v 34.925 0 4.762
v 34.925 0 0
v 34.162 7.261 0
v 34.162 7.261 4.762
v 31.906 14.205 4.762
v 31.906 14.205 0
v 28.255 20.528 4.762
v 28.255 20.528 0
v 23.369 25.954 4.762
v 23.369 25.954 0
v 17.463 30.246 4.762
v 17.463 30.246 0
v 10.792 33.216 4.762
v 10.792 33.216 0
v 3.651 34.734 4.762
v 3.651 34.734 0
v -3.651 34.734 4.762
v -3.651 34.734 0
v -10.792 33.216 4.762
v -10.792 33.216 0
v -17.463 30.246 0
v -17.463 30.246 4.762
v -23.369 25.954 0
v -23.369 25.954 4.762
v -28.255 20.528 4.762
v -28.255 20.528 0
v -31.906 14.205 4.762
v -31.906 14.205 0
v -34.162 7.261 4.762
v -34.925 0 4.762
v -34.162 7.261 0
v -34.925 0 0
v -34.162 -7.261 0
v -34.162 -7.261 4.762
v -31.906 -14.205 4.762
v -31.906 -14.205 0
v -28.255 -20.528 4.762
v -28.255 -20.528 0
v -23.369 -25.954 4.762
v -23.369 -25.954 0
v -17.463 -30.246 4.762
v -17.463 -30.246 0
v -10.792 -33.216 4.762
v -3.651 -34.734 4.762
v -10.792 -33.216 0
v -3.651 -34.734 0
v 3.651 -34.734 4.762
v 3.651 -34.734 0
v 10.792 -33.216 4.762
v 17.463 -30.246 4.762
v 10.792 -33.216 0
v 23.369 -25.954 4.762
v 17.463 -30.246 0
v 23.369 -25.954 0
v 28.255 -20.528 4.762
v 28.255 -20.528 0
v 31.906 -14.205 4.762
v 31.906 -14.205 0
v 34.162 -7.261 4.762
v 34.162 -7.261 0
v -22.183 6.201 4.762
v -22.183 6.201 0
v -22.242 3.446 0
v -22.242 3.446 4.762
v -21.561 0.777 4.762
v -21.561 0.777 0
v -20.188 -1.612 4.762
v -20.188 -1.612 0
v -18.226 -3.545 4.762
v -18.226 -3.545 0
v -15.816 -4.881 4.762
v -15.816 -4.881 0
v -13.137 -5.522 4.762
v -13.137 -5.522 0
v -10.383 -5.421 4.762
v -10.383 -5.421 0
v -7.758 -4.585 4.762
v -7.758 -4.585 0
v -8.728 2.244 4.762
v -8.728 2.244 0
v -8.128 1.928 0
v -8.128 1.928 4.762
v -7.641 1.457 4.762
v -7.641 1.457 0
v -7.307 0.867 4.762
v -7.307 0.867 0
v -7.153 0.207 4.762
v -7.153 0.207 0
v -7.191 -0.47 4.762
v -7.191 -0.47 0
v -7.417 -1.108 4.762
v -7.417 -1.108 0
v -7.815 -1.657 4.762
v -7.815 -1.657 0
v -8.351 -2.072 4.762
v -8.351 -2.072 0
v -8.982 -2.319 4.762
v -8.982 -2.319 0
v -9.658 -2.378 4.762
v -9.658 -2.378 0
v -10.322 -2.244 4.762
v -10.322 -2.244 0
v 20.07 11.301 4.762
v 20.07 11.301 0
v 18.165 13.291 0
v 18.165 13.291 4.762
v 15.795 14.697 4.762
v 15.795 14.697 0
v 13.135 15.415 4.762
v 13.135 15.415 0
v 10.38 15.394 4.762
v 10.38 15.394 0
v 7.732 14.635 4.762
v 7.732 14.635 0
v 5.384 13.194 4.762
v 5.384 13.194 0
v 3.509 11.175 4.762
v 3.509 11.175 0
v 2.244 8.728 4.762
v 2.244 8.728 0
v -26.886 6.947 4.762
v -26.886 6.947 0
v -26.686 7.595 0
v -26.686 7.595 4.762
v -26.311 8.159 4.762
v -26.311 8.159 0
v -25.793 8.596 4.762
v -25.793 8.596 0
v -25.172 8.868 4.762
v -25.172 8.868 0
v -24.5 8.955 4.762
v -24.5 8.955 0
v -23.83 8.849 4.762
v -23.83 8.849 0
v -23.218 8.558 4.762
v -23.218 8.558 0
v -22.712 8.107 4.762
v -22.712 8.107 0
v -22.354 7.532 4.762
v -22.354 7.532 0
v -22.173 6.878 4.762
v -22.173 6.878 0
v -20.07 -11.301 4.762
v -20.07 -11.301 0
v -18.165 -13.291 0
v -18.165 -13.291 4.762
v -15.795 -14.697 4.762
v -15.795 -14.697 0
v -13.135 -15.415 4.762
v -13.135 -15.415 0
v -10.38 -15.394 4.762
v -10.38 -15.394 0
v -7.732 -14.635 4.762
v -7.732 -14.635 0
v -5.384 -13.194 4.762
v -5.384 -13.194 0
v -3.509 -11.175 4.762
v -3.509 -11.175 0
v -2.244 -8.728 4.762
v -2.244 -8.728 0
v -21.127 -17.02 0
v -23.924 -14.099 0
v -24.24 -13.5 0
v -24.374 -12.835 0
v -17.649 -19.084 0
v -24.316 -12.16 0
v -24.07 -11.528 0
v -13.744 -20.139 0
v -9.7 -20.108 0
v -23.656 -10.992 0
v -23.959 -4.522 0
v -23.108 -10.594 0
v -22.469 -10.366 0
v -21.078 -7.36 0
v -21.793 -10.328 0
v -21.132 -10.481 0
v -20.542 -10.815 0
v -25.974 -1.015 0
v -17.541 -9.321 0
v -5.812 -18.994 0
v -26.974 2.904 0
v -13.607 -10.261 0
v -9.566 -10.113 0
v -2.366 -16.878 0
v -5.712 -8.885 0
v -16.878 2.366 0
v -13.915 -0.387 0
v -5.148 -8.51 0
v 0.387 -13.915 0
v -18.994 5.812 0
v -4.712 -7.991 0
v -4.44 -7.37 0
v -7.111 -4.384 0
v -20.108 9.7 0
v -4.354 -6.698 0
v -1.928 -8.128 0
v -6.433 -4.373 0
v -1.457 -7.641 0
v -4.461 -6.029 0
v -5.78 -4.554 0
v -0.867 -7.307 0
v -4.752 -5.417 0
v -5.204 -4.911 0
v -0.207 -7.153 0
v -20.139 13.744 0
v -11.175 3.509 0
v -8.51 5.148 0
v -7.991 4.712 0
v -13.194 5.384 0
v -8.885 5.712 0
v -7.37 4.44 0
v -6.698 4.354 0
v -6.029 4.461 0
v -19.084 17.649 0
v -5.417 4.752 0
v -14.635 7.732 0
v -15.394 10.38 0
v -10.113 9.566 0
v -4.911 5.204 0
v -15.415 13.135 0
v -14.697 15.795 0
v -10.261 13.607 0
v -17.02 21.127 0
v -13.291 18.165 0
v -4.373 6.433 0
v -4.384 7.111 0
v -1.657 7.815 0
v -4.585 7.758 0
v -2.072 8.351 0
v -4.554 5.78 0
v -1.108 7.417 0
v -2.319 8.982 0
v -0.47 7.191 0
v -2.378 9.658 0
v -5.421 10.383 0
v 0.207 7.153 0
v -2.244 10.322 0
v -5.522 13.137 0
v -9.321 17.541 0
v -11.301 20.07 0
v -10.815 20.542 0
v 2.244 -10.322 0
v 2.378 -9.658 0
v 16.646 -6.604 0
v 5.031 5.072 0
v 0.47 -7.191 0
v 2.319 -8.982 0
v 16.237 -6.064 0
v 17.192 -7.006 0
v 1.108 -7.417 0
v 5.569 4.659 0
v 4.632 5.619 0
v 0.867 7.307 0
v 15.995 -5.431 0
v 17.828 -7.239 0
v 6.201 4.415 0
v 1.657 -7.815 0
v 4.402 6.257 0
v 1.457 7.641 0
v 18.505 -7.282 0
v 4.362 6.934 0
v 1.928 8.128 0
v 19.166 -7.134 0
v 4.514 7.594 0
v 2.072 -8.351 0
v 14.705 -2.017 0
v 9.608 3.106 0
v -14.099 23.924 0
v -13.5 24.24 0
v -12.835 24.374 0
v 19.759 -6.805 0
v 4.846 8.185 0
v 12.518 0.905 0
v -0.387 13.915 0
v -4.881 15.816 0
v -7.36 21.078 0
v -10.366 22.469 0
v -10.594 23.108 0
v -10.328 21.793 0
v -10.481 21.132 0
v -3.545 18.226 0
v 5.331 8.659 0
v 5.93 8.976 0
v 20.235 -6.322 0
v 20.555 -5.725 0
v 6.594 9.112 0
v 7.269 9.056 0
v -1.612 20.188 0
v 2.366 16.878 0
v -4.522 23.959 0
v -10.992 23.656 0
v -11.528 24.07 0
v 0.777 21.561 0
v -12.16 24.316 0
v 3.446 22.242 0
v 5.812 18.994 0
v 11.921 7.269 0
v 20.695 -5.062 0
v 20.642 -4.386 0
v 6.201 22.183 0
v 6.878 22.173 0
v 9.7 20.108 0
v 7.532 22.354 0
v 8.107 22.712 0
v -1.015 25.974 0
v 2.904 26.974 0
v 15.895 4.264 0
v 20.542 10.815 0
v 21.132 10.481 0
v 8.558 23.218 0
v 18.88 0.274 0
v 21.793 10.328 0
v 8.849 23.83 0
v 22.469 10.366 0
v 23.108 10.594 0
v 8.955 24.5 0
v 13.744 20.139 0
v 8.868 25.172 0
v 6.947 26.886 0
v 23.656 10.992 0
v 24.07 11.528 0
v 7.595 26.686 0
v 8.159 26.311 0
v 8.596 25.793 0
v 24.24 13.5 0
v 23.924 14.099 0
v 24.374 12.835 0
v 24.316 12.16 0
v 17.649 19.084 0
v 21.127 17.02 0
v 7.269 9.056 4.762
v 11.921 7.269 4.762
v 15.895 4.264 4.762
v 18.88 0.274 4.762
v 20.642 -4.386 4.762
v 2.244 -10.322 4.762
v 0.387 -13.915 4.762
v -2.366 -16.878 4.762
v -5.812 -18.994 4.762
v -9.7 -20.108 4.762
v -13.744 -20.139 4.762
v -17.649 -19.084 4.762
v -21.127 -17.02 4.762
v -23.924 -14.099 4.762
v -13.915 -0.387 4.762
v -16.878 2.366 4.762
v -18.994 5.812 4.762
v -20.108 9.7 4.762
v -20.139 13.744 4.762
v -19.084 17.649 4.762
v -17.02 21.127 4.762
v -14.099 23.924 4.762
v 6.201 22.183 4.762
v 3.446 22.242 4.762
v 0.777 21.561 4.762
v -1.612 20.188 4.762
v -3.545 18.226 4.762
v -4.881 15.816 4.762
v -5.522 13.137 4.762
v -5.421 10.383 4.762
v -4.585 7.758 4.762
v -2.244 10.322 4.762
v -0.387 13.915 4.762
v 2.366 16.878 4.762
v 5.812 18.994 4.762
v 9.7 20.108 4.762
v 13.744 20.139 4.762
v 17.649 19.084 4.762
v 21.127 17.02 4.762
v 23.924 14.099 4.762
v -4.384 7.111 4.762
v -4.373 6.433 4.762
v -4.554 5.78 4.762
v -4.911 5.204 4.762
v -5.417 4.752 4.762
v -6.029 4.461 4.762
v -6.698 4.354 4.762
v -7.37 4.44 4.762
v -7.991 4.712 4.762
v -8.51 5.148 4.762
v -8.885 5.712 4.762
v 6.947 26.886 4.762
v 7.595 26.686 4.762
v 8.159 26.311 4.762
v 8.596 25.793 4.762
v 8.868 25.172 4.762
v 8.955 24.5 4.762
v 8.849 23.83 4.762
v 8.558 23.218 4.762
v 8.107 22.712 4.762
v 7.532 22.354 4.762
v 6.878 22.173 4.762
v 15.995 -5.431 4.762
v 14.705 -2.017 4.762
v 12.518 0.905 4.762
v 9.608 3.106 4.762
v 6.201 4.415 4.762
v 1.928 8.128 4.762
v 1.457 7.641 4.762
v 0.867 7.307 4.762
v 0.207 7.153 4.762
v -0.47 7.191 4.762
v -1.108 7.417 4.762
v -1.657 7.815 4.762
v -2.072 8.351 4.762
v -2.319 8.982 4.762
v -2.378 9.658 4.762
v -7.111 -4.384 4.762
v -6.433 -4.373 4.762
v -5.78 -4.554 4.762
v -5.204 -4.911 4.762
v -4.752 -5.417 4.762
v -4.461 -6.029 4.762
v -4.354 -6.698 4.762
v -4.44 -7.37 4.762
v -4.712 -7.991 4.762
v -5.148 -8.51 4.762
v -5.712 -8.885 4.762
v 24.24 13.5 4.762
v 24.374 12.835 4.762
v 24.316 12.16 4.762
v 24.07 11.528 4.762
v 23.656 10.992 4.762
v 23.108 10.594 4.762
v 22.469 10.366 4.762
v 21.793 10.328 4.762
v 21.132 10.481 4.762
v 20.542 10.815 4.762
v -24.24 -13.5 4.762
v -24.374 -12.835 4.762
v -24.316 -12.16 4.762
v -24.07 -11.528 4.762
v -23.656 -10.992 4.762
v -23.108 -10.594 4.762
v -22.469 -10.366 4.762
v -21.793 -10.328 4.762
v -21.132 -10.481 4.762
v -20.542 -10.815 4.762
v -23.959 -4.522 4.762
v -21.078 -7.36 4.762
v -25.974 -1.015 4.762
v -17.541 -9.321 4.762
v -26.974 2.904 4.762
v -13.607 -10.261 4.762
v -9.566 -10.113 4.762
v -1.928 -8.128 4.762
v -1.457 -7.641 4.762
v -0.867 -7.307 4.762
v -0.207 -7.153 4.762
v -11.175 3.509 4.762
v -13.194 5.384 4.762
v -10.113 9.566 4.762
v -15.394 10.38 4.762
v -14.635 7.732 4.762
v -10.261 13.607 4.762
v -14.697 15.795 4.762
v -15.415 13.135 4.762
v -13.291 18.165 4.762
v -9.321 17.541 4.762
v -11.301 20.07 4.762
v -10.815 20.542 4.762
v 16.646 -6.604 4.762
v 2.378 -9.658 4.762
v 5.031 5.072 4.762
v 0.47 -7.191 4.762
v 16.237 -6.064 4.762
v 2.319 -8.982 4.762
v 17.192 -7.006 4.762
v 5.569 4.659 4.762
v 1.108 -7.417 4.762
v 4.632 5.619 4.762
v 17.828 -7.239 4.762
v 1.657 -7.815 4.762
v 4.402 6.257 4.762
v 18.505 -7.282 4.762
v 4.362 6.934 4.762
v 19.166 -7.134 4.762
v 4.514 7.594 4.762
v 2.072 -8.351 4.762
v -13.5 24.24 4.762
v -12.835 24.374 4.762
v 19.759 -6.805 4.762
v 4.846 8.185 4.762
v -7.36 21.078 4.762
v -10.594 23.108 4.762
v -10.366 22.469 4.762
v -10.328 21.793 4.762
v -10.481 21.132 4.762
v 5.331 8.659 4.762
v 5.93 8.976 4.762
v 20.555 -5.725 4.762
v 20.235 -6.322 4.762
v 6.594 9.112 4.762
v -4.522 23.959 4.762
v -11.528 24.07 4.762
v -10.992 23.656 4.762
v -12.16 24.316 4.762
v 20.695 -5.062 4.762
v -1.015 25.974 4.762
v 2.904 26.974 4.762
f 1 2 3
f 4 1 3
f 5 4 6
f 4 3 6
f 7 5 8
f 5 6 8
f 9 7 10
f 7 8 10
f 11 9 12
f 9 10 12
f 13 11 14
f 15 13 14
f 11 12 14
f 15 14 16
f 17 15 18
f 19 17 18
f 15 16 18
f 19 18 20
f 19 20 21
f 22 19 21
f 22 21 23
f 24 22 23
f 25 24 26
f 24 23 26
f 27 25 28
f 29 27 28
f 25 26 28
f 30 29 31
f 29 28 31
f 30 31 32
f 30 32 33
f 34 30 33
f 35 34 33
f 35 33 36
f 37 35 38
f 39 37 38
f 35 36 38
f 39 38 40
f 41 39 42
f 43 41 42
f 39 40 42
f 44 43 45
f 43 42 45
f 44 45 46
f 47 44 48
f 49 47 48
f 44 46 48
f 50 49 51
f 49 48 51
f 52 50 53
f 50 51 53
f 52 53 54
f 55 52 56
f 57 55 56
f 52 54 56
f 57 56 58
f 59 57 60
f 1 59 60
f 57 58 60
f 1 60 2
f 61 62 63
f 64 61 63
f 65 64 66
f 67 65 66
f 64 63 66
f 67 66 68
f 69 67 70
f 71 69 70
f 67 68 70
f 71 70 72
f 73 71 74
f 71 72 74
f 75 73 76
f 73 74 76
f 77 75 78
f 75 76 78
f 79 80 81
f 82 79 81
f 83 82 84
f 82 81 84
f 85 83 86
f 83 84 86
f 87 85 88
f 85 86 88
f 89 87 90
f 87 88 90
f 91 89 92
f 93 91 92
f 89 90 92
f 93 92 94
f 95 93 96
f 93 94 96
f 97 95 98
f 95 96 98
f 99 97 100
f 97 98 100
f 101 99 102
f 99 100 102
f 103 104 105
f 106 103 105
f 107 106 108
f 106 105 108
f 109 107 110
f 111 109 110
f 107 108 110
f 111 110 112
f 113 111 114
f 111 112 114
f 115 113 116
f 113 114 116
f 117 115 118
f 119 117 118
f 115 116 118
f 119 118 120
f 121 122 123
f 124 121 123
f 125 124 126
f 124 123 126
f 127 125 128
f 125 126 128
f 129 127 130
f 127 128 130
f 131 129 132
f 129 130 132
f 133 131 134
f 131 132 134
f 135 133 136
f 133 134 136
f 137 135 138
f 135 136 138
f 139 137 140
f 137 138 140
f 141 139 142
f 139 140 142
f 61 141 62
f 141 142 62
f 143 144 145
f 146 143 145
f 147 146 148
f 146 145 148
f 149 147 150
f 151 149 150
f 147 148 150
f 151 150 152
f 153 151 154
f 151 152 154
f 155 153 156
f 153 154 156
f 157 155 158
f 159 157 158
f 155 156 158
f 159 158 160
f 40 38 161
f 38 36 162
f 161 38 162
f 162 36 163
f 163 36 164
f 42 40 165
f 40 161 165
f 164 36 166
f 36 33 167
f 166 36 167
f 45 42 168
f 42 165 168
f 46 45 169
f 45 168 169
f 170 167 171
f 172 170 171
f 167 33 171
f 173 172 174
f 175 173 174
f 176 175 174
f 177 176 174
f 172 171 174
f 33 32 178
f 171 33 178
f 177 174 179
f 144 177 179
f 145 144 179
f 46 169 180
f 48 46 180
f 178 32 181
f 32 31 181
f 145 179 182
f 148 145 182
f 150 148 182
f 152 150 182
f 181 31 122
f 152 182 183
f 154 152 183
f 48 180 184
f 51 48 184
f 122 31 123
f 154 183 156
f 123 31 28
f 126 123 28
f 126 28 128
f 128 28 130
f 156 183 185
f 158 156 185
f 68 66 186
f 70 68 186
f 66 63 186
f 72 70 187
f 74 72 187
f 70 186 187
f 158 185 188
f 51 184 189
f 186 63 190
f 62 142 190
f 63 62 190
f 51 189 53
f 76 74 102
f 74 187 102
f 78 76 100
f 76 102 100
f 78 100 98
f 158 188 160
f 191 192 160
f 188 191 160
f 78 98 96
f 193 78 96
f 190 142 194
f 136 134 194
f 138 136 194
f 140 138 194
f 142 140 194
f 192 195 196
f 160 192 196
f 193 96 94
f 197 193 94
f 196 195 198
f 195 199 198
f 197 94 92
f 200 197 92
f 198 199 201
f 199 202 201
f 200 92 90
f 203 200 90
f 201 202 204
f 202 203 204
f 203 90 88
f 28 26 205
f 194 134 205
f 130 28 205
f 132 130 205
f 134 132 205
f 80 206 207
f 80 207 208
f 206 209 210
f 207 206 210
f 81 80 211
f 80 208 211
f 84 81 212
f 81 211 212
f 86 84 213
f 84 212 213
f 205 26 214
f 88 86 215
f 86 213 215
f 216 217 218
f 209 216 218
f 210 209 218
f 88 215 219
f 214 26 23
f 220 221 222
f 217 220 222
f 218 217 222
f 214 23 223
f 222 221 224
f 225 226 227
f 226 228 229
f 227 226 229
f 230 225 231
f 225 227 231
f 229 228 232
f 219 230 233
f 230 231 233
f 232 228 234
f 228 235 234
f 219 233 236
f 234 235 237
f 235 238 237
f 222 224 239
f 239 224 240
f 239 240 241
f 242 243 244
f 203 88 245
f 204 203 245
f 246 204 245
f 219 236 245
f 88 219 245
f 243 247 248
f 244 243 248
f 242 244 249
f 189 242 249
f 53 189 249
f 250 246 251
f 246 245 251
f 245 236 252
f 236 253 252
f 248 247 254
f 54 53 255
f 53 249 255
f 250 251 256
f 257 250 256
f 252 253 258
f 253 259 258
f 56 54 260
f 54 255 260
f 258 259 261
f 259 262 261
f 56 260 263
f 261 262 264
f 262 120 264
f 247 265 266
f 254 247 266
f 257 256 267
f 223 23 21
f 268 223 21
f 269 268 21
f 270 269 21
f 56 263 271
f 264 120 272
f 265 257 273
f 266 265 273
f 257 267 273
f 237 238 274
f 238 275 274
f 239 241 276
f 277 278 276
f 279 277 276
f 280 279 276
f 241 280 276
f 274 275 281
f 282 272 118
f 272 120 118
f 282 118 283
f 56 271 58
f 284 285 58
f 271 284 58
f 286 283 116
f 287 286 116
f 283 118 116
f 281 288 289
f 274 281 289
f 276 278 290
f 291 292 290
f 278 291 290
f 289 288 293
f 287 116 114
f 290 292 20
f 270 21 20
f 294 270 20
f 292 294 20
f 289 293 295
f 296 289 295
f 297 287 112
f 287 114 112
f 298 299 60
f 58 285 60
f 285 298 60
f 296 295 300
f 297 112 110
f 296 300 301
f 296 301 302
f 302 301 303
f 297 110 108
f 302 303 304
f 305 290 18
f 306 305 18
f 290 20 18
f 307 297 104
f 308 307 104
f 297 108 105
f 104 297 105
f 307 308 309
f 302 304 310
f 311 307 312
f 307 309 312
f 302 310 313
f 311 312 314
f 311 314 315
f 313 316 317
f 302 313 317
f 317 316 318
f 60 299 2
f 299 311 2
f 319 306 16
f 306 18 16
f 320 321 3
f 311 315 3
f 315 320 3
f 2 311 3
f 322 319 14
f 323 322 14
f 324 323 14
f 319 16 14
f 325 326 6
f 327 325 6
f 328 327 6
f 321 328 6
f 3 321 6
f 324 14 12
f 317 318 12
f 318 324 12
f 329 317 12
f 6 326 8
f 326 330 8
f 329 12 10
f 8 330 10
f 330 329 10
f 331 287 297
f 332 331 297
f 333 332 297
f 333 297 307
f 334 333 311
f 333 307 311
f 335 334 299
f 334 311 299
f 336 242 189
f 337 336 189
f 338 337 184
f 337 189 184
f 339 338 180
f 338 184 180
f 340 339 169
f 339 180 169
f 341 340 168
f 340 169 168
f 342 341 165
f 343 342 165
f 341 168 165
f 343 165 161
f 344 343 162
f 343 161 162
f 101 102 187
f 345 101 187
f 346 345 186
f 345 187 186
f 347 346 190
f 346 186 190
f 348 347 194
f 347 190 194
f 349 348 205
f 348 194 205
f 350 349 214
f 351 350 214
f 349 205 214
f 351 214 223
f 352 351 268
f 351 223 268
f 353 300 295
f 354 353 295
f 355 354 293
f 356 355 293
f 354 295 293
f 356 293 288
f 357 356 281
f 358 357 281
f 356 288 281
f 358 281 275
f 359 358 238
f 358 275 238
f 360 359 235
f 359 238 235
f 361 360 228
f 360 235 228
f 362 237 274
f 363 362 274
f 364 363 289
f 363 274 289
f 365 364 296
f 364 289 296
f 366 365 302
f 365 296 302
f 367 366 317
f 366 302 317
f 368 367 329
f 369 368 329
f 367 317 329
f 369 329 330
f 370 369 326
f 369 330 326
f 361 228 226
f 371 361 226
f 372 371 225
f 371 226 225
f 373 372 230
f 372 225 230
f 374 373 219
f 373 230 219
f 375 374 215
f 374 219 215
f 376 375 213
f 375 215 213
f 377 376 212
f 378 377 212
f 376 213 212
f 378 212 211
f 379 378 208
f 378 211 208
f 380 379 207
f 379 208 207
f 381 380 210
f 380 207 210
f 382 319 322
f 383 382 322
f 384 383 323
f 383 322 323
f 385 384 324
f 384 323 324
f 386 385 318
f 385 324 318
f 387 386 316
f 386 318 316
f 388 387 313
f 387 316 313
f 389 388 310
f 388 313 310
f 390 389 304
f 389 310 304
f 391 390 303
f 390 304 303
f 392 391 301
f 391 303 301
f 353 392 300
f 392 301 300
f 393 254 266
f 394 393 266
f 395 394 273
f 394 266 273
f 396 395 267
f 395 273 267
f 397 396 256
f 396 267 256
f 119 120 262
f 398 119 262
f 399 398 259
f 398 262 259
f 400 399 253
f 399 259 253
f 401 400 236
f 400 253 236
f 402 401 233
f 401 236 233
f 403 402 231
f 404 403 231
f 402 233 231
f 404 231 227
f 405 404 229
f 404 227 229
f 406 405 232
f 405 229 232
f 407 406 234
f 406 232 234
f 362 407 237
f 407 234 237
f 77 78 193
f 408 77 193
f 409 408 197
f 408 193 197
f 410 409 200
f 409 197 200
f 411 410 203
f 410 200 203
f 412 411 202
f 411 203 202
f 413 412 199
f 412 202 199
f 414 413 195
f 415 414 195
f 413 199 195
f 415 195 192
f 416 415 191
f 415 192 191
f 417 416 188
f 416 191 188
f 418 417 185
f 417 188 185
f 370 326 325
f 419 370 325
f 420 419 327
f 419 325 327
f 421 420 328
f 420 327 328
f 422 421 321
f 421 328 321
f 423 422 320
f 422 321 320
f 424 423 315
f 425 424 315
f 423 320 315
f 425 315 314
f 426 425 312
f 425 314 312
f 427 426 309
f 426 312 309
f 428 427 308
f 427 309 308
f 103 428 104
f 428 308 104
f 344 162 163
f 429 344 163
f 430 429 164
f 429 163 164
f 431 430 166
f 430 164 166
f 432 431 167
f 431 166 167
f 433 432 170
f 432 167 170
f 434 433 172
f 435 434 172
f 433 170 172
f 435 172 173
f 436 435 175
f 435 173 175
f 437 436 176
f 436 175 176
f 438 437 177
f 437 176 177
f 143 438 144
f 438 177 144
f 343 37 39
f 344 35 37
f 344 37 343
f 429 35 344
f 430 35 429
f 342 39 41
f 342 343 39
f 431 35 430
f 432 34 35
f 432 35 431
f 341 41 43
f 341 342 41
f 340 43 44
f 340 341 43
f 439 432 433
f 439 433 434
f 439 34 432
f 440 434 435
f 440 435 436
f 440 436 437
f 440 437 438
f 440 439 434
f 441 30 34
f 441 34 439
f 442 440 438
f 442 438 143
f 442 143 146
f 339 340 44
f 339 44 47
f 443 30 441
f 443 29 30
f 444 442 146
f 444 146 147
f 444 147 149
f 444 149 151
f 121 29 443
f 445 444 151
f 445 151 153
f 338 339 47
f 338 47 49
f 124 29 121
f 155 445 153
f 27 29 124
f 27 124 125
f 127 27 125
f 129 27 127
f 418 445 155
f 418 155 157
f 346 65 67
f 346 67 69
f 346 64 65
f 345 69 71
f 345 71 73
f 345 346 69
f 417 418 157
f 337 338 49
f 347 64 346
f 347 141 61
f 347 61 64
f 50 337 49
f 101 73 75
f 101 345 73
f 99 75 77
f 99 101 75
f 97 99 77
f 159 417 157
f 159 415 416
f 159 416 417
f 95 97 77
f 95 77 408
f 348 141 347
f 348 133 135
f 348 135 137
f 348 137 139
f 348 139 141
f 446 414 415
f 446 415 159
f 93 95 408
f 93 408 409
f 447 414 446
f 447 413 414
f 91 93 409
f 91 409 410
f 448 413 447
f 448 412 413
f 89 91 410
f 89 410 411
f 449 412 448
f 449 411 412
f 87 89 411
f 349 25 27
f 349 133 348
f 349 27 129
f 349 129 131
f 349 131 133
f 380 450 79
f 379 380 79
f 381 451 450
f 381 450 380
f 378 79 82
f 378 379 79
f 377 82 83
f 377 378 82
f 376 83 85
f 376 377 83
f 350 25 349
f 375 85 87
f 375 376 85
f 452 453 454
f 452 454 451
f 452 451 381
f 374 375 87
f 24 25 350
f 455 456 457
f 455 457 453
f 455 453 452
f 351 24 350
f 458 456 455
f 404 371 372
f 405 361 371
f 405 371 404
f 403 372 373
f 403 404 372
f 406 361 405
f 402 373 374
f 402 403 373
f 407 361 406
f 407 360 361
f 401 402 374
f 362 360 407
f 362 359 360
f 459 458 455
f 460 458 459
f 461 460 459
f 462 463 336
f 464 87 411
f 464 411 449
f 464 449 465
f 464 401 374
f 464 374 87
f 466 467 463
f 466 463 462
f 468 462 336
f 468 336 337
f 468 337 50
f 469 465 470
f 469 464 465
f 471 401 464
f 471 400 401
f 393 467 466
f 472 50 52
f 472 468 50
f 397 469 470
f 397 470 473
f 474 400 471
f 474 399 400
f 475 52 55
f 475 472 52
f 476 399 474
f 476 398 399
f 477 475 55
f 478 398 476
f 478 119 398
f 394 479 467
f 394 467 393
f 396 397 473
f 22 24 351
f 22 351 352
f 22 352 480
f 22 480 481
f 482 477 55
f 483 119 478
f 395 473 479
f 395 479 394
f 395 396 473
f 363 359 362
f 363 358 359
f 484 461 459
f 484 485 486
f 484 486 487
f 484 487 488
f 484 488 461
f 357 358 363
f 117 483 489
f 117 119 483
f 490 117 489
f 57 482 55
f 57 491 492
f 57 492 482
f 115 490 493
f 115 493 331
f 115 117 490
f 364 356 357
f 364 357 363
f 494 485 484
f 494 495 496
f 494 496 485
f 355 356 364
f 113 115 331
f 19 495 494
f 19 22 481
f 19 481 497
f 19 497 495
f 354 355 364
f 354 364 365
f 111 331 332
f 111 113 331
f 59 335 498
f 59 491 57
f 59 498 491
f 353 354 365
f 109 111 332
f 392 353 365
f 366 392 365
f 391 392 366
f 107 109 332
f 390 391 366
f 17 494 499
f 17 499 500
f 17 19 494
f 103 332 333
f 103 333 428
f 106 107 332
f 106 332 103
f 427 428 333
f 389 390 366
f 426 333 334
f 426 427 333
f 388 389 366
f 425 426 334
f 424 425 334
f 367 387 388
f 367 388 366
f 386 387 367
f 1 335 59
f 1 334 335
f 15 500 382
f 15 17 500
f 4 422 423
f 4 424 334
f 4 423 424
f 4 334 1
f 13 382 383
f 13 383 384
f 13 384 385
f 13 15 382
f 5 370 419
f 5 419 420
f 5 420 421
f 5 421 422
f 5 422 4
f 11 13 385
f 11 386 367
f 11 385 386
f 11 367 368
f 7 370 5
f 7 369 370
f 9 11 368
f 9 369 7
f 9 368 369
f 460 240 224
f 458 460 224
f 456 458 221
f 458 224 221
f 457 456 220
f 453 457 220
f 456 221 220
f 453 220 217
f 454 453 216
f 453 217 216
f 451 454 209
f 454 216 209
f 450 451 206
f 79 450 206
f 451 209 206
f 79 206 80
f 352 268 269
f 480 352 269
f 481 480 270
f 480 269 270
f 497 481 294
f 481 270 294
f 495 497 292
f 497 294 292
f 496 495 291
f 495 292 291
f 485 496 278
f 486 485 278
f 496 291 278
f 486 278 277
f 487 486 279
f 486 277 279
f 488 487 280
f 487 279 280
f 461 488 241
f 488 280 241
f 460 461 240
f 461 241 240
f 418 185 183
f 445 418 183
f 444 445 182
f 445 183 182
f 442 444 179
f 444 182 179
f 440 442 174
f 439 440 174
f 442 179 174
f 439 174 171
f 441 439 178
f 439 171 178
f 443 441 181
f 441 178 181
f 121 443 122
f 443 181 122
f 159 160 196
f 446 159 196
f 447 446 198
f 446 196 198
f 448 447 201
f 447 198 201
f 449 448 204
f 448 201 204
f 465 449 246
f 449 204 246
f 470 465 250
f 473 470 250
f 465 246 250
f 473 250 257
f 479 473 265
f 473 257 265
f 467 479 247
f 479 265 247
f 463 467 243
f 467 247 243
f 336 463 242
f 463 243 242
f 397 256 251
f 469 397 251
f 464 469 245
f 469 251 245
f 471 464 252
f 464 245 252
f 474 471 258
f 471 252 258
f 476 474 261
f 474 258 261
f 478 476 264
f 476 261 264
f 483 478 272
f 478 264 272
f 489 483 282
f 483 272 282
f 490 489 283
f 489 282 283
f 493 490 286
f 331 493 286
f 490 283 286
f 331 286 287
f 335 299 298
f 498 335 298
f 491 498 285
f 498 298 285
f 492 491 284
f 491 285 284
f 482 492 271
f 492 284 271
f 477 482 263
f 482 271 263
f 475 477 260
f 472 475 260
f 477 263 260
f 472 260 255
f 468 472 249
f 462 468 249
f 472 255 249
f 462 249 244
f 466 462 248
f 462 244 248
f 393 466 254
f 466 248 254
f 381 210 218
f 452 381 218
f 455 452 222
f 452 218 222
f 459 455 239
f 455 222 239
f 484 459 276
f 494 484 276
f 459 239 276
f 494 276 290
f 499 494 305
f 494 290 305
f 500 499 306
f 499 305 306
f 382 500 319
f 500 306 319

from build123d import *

# Parameters (mm, degrees)
SKETCH1_R           = 34.925
BOSS_EXTRUDE1_DEPTH = 4.7625


with BuildPart() as part:
    # Sketch1 → Boss-Extrude1 (new body)
    with BuildSketch(Plane.XY):
        Circle(SKETCH1_R)
        with BuildLine():
            ThreePointArc((2.243888697, 8.727933453), (-0.797066547, 7.281111303), (-2.243888697, 10.322066547))
            ThreePointArc((-2.243888697, 10.322066547), (9.70011878, 20.108105734), (23.923949148, 14.099068603))
            ThreePointArc((23.923949148, 14.099068603), (23.396113859, 10.773096108), (20.070141364, 11.300931397))
            ThreePointArc((20.070141364, 11.300931397), (10.380475923, 15.394453179), (2.243888697, 8.727933453))
        make_face(mode=Mode.SUBTRACT)
        with BuildLine():
            ThreePointArc((2.243888697, -10.322066547), (-9.70011878, -20.108105734), (-23.923949148, -14.099068603))
            ThreePointArc((-23.923949148, -14.099068603), (-23.396113859, -10.773096108), (-20.070141364, -11.300931397))
            ThreePointArc((-20.070141364, -11.300931397), (-10.380475923, -15.394453179), (-2.243888697, -8.727933453))
            ThreePointArc((-2.243888697, -8.727933453), (0.797066547, -7.281111303), (2.243888697, -10.322066547))
        make_face(mode=Mode.SUBTRACT)
        with BuildLine():
            ThreePointArc((-5.712134337, -8.885472165), (-21.077597689, -7.359558154), (-26.886333692, 6.947239658))
            ThreePointArc((-26.886333692, 6.947239658), (-24.161280075, 8.92582145), (-22.182698283, 6.200767833))
            ThreePointArc((-22.182698283, 6.200767833), (-18.225627153, -3.545417318), (-7.758249844, -4.584912017))
            ThreePointArc((-7.758249844, -4.584912017), (-4.584912017, -5.712134337), (-5.712134337, -8.885472165))
        make_face(mode=Mode.SUBTRACT)
        with BuildLine():
            ThreePointArc((-10.322066547, -2.243888697), (-20.108105734, 9.70011878), (-14.099068603, 23.923949148))
            ThreePointArc((-14.099068603, 23.923949148), (-10.773096108, 23.396113859), (-11.300931397, 20.070141364))
            ThreePointArc((-11.300931397, 20.070141364), (-15.394453179, 10.380475923), (-8.727933453, 2.243888697))
            ThreePointArc((-8.727933453, 2.243888697), (-7.281111303, -0.797066547), (-10.322066547, -2.243888697))
        make_face(mode=Mode.SUBTRACT)
        with BuildLine():
            ThreePointArc((-8.885472165, 5.712134337), (-7.359558154, 21.077597689), (6.947239658, 26.886333692))
            ThreePointArc((6.947239658, 26.886333692), (8.92582145, 24.161280075), (6.200767833, 22.182698283))
            ThreePointArc((6.200767833, 22.182698283), (-3.545417318, 18.225627153), (-4.584912017, 7.758249844))
            ThreePointArc((-4.584912017, 7.758249844), (-5.712134337, 4.584912017), (-8.885472165, 5.712134337))
        make_face(mode=Mode.SUBTRACT)
        with BuildLine():
            ThreePointArc((6.201017431, 4.414629875), (4.414629875, 7.269366751), (7.269366751, 9.055754306))
            ThreePointArc((7.269366751, 9.055754306), (15.894637853, 4.263683482), (20.641911756, -4.386324314))
            ThreePointArc((20.641911756, -4.386324314), (18.840742957, -7.231758214), (15.995309056, -5.430589416))
            ThreePointArc((15.995309056, -5.430589416), (12.518320569, 0.90483132), (6.201017431, 4.414629875))
        make_face(mode=Mode.SUBTRACT)
    extrude(amount=BOSS_EXTRUDE1_DEPTH)


solid = part.part
